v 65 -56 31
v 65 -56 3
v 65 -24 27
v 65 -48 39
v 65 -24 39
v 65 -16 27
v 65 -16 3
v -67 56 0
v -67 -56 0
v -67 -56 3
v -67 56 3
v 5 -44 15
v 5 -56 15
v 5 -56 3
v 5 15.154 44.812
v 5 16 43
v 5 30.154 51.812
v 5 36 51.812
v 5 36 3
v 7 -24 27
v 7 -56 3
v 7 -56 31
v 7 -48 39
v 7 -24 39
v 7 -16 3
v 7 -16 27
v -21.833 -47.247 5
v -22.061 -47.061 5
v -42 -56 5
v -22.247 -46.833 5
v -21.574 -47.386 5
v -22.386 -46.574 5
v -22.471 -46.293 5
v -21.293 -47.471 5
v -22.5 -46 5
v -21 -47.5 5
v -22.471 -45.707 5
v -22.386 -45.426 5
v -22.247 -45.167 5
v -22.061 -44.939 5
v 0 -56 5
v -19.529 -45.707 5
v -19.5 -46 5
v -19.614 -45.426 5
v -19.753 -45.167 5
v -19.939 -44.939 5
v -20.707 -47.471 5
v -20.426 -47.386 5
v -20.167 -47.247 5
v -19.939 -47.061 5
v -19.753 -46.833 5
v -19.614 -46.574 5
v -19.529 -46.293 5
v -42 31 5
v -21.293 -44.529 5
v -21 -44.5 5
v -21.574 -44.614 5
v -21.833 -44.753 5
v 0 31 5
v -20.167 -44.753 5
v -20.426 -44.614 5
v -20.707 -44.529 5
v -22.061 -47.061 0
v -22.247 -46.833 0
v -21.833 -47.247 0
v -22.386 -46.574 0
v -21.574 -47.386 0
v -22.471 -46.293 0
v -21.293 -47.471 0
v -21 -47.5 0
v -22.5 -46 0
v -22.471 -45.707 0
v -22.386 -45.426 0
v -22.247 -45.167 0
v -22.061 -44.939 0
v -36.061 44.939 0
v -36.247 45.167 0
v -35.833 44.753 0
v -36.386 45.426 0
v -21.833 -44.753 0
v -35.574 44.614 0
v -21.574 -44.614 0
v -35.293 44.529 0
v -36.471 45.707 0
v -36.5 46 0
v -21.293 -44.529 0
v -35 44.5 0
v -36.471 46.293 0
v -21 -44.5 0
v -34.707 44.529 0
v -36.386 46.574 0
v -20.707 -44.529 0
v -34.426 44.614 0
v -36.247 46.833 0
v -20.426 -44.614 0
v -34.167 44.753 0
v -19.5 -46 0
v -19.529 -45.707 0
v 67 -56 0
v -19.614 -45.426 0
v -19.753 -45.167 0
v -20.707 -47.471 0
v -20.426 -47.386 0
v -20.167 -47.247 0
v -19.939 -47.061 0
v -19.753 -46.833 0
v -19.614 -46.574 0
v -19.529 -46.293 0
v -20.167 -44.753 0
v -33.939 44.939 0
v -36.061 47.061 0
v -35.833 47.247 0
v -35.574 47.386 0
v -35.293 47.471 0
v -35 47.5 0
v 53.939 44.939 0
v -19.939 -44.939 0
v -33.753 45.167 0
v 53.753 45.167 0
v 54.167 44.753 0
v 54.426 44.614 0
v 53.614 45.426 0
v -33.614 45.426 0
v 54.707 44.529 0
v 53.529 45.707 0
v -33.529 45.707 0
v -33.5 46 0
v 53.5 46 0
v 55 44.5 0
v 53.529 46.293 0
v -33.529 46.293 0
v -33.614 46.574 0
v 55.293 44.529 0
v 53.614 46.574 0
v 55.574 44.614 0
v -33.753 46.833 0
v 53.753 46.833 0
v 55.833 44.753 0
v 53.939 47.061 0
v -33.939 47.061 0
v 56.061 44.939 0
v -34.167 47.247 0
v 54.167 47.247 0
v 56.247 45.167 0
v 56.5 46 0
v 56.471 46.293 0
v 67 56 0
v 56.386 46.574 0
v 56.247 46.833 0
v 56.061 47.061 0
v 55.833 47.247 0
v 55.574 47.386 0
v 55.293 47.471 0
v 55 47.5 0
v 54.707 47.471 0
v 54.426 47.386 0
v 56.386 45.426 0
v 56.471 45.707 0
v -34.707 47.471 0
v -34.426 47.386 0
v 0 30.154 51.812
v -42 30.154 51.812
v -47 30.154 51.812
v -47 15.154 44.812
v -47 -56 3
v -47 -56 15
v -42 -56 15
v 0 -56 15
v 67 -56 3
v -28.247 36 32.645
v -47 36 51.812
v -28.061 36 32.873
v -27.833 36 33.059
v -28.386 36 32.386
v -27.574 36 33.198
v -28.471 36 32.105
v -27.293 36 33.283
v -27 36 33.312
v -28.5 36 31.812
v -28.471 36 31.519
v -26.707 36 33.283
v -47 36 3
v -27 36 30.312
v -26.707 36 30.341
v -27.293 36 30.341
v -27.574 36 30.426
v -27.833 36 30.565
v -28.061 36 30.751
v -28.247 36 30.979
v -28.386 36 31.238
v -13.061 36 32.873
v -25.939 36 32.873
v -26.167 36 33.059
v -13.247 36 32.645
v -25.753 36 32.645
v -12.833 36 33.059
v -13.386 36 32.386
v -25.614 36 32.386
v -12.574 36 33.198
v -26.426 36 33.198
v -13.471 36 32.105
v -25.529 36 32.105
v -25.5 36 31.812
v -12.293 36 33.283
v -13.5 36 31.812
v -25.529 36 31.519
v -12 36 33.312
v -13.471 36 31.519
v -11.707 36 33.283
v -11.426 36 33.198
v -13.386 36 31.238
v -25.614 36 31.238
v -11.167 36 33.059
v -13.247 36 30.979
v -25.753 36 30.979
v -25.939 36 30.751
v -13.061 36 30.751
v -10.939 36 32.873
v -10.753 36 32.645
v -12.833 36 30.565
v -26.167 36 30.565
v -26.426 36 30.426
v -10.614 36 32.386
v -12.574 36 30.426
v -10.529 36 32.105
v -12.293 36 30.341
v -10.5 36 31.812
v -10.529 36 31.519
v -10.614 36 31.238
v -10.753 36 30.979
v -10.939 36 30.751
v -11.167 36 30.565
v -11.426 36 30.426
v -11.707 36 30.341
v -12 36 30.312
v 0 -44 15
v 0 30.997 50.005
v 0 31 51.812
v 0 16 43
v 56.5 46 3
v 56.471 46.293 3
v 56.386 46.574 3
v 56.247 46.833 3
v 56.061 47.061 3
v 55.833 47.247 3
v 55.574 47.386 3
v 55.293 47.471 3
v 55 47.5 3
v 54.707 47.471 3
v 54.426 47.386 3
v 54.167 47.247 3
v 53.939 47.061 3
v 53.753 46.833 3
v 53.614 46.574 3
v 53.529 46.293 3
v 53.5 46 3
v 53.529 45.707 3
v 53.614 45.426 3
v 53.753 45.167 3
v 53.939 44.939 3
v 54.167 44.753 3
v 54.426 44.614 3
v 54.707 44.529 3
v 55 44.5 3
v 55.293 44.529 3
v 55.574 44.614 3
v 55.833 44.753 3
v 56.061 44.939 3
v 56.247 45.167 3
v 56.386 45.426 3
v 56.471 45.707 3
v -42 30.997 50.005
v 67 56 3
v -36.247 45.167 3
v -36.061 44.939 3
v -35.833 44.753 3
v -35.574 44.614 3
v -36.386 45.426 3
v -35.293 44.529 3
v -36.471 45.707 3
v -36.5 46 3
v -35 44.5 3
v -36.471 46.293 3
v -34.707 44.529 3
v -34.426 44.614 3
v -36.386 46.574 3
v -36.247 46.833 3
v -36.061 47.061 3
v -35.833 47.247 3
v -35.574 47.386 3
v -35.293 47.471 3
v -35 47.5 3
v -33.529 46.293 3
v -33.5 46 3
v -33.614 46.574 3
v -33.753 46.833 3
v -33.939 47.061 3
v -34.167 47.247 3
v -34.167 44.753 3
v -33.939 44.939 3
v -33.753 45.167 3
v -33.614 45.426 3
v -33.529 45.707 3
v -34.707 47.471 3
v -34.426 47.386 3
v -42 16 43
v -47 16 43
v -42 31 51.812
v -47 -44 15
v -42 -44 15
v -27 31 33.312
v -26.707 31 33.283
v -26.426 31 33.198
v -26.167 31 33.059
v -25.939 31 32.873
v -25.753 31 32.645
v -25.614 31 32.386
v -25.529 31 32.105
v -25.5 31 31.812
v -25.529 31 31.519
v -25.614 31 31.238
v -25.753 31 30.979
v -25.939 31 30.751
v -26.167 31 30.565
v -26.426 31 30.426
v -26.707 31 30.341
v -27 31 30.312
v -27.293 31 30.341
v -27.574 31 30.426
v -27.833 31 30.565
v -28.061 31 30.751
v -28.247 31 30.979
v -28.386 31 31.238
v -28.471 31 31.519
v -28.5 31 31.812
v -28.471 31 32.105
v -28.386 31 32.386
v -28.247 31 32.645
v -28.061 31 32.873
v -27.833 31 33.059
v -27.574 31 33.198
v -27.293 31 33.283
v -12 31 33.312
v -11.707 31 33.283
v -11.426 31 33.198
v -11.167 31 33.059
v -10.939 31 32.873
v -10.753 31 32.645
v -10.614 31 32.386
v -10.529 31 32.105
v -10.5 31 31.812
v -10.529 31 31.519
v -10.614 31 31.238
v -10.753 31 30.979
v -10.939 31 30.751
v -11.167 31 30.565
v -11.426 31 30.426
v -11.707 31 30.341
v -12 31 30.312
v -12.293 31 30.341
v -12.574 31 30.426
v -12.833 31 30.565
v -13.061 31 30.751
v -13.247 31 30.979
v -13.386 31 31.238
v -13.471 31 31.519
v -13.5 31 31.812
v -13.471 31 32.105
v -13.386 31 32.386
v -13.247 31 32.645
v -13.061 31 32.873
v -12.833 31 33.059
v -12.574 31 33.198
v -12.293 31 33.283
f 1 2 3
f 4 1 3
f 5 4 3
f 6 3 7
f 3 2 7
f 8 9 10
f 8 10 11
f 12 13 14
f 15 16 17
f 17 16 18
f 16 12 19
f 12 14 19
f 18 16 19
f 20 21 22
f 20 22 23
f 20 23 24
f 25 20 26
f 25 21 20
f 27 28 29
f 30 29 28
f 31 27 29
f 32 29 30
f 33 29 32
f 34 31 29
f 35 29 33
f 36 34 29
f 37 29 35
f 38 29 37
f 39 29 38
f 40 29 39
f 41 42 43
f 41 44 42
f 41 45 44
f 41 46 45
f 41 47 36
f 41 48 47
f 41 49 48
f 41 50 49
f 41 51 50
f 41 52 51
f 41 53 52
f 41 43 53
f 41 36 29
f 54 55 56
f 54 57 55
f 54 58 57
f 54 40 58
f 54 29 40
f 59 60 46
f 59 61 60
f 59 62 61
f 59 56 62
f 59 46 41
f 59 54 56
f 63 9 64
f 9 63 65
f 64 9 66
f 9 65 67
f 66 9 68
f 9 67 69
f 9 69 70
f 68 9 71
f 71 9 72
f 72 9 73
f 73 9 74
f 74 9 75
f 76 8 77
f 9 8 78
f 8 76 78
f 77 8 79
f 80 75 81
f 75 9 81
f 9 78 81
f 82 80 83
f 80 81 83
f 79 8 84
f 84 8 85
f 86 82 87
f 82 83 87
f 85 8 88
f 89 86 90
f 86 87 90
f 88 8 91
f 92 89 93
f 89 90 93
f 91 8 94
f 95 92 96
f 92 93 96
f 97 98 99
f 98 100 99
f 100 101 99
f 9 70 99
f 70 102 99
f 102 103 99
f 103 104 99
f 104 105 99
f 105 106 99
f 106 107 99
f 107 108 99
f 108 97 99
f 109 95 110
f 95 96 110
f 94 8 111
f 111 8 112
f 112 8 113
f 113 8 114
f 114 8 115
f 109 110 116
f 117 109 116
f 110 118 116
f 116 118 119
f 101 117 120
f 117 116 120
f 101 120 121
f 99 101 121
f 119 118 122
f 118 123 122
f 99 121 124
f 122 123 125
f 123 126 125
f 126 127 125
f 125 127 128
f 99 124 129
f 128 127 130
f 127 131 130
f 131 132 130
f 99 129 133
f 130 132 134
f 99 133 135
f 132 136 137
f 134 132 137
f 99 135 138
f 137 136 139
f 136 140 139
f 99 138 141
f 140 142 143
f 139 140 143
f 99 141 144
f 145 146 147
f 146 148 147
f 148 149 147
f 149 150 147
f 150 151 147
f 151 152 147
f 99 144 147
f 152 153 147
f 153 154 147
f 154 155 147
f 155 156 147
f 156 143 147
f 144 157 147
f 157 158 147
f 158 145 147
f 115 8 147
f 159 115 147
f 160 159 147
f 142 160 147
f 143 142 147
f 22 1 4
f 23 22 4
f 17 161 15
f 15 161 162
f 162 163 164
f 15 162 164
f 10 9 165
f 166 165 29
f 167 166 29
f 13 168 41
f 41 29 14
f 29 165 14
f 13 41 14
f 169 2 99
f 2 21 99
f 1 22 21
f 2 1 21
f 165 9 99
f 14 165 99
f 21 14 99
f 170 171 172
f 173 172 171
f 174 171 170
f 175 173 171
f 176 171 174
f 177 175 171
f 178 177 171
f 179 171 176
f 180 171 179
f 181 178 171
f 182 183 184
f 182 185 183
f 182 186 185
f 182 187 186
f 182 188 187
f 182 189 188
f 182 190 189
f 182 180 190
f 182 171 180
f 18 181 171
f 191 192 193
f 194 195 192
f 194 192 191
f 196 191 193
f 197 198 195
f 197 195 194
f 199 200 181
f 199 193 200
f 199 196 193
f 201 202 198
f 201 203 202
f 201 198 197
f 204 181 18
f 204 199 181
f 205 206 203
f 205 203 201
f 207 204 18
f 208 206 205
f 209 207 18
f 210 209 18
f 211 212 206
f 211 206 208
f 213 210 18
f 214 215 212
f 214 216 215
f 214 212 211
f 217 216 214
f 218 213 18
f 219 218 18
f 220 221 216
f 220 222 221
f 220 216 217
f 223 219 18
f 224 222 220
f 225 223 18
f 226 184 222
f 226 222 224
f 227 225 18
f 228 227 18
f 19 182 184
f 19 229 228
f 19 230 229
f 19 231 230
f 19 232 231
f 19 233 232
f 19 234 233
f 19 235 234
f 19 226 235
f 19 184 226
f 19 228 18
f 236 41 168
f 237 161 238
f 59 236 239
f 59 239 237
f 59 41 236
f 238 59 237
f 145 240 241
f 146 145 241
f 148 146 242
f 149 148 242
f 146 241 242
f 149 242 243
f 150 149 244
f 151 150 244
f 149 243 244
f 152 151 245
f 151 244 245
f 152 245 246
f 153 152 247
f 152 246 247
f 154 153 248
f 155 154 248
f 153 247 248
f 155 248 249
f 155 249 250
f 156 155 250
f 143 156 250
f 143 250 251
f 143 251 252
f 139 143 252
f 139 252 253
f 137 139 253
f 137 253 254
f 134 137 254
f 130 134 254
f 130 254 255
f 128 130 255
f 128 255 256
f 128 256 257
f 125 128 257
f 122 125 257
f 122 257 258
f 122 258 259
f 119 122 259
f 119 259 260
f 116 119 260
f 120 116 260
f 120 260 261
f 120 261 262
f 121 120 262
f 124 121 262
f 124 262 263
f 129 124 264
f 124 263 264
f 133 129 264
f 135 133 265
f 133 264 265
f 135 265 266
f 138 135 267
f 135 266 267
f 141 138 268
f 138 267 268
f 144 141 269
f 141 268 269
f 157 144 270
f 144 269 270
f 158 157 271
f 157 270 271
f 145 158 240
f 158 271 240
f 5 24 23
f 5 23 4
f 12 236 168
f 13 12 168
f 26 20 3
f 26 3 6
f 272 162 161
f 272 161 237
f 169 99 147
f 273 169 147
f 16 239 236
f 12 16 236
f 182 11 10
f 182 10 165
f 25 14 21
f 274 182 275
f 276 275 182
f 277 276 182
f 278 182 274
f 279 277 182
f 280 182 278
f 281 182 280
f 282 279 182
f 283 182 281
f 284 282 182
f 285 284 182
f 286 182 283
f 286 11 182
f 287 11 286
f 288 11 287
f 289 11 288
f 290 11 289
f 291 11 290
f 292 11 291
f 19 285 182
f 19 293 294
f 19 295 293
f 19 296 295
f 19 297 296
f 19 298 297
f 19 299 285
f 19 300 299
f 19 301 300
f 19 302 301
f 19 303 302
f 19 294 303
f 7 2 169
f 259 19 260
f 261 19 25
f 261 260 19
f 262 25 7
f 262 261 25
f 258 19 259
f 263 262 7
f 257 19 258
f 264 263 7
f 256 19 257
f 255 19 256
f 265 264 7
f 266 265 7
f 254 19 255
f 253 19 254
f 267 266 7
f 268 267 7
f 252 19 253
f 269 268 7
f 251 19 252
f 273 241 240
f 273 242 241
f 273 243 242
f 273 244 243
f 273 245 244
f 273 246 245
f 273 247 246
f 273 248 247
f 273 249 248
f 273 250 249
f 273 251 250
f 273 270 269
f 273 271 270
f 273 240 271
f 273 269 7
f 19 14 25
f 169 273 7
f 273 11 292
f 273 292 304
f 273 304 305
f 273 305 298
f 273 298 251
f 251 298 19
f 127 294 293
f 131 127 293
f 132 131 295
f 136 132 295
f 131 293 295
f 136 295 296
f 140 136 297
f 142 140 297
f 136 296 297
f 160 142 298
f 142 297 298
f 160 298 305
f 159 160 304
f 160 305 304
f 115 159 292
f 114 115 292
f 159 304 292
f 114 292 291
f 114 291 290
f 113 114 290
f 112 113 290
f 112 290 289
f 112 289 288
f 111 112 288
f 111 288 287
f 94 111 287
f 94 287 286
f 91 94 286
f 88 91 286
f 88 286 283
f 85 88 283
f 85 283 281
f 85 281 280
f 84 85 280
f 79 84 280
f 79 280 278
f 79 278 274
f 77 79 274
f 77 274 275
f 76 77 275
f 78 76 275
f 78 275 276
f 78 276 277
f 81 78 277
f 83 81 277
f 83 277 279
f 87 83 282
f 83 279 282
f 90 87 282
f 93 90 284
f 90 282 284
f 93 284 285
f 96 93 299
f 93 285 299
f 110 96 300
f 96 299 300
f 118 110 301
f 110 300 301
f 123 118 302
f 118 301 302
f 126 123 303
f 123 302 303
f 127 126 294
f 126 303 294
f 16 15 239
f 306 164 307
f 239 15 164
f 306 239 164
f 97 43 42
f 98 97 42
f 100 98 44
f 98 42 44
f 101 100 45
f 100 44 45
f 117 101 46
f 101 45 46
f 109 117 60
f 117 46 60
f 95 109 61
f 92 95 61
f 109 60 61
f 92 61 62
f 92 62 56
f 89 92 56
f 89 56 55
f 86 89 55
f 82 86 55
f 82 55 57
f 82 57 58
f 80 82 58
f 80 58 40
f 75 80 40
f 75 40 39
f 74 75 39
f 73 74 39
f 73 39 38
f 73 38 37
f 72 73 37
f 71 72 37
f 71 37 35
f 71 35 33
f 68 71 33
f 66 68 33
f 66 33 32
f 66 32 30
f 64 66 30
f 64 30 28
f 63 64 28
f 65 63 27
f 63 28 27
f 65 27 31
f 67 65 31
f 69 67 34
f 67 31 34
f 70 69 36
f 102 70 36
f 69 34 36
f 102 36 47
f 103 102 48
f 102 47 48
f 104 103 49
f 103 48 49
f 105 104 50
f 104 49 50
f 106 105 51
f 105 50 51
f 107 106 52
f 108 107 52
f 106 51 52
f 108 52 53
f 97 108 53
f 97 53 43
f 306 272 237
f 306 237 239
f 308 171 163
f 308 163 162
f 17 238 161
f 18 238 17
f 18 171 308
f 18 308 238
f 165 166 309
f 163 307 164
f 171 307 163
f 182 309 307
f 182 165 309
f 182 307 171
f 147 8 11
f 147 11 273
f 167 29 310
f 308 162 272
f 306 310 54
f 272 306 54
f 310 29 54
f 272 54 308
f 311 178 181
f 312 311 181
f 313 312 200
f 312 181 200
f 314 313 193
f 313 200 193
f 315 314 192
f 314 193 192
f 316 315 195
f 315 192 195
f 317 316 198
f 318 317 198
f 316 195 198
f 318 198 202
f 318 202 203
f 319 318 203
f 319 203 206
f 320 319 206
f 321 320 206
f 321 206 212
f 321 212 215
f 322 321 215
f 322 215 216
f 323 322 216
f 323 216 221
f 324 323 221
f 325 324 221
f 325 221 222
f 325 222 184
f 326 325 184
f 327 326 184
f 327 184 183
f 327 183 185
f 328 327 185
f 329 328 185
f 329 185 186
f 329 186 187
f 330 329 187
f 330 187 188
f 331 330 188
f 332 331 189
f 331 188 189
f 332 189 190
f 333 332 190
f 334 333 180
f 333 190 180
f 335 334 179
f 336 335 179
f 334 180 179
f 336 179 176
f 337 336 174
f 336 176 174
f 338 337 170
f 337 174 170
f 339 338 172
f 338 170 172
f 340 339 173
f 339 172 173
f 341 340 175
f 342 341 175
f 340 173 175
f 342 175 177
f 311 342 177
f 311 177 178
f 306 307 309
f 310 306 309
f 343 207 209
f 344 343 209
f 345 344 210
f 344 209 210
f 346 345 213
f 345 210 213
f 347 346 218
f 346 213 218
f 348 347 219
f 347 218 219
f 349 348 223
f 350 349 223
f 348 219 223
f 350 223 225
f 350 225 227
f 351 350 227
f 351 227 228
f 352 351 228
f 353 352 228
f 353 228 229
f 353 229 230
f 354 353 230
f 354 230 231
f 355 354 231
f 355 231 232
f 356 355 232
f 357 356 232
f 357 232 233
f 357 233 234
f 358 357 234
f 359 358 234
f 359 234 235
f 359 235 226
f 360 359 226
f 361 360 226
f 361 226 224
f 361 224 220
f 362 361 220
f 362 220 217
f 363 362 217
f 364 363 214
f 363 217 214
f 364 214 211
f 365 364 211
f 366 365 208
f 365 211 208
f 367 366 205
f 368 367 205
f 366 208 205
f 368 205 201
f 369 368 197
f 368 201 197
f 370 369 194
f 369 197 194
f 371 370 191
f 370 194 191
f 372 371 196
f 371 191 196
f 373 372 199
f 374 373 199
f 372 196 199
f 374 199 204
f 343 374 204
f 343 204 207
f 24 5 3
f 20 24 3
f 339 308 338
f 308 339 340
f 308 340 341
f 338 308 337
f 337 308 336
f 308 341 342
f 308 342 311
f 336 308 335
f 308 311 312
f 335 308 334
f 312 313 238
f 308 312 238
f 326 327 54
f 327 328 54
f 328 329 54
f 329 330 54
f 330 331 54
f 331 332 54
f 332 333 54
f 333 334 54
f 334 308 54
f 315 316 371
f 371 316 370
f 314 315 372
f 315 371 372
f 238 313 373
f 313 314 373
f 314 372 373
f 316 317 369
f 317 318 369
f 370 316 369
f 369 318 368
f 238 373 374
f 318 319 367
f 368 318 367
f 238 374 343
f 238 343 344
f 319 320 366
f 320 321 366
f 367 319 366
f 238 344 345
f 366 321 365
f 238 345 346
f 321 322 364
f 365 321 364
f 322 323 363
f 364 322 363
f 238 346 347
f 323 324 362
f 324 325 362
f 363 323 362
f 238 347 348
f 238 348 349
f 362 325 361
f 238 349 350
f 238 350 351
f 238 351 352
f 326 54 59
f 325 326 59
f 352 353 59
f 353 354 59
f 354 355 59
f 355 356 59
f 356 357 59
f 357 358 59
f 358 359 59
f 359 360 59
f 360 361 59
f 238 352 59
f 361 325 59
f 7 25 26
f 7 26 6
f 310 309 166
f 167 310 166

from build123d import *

# Parameters (mm, degrees)
CROQUIS1_W              = 134
CROQUIS1_H              = 112
SALIENTE_EXTRUIR1_DEPTH = 3
CROQUIS2_W              = 52
CROQUIS2_H              = 92
SALIENTE_EXTRUIR2_DEPTH = 48.812
VACIADO1_T              = -5
CORTAR_EXTRUIR1_DEPTH   = 58.812
SALIENTE_EXTRUIR3_DEPTH = 48.812
CROQUIS5_W              = 58
CROQUIS5_H              = 40
SALIENTE_EXTRUIR4_DEPTH = 36
CROQUIS6_W              = 12
CROQUIS6_H              = 7.999587761
CORTAR_EXTRUIR2_DEPTH   = 58
CROQUIS7_R              = 1.5
CORTAR_EXTRUIR3_DEPTH   = 58
CROQUIS8_R              = 1.5
CORTAR_EXTRUIR4_DEPTH   = 58


with BuildPart() as part:
    # Croquis1 → Saliente-Extruir1 (new body)
    with BuildSketch(Plane.XY):
        Rectangle(CROQUIS1_W, CROQUIS1_H)
    extrude(amount=SALIENTE_EXTRUIR1_DEPTH)

    # Croquis2 → Saliente-Extruir2 (add)
    with BuildSketch(Plane.XY.offset(3)):
        with Locations((-21, -10)):
            Rectangle(CROQUIS2_W, CROQUIS2_H)
    extrude(amount=SALIENTE_EXTRUIR2_DEPTH)

    # Vaciado1
    vaciado1_openings = [part.faces().sort_by_distance(p)[0] for p in [
        (-21, -10, 51.812),
        (-18.128790187, -56, 23.864020885),
    ]]
    offset(amount=VACIADO1_T, openings=vaciado1_openings)

    # Croquis3 → Cortar-Extruir1 (cut)
    with BuildSketch(Plane.ZY.offset(47)):
        Polygon((15, -44), (15, -56), (51.812, -56), (51.812, 30.154), (44.811949005, 15.153963498), (43.00020398, 16.000146009), align=None)
    extrude(amount=-CORTAR_EXTRUIR1_DEPTH, mode=Mode.SUBTRACT)

    # Croquis4 → Saliente-Extruir3 (add)
    with BuildSketch(Plane.ZY.offset(47)):
        Polygon((43.00020398, 16.000146009), (44.811949005, 15.153963498), (51.812, 30.154), (50.004728246, 30.997397577), align=None)
    extrude(amount=-SALIENTE_EXTRUIR3_DEPTH)

    # Croquis5 → Saliente-Extruir4 (add)
    with BuildSketch(Plane.XY.offset(3)):
        with Locations((36, -36)):
            Rectangle(CROQUIS5_W, CROQUIS5_H)
    extrude(amount=SALIENTE_EXTRUIR4_DEPTH)

    # Croquis6 → Cortar-Extruir2 (cut)
    with BuildSketch(Plane(origin=(65, 0, 0), x_dir=(0, 0, -1), z_dir=(1, 0, 0))):
        with Locations((-33, -19.999793881)):
            Rectangle(CROQUIS6_W, CROQUIS6_H)
        Polygon((-39, -56), (-31, -56), (-39, -47.999587761), align=None)
    extrude(amount=-CORTAR_EXTRUIR2_DEPTH, mode=Mode.SUBTRACT)

    # Croquis7 → Cortar-Extruir3 (cut)
    with BuildSketch(Plane.XY.offset(5)):
        with Locations((-21, -46)):
            Circle(CROQUIS7_R)
        with Locations((-35, 46)):
            Circle(CROQUIS7_R)
        with Locations((55, 46)):
            Circle(CROQUIS7_R)
    extrude(amount=-CORTAR_EXTRUIR3_DEPTH, mode=Mode.SUBTRACT)

    # Croquis8 → Cortar-Extruir4 (cut)
    with BuildSketch(Plane(origin=(0, 36, 0), x_dir=(1, 0, 0), z_dir=(0, 1, 0))):
        with Locations(Location((-27, -31.812, 0), (0, 0, 270))):
            Circle(CROQUIS8_R)
        with Locations(Location((-12, -31.812, 0), (0, 0, 270))):
            Circle(CROQUIS8_R)
    extrude(amount=-CORTAR_EXTRUIR4_DEPTH, mode=Mode.SUBTRACT)


solid = part.part
